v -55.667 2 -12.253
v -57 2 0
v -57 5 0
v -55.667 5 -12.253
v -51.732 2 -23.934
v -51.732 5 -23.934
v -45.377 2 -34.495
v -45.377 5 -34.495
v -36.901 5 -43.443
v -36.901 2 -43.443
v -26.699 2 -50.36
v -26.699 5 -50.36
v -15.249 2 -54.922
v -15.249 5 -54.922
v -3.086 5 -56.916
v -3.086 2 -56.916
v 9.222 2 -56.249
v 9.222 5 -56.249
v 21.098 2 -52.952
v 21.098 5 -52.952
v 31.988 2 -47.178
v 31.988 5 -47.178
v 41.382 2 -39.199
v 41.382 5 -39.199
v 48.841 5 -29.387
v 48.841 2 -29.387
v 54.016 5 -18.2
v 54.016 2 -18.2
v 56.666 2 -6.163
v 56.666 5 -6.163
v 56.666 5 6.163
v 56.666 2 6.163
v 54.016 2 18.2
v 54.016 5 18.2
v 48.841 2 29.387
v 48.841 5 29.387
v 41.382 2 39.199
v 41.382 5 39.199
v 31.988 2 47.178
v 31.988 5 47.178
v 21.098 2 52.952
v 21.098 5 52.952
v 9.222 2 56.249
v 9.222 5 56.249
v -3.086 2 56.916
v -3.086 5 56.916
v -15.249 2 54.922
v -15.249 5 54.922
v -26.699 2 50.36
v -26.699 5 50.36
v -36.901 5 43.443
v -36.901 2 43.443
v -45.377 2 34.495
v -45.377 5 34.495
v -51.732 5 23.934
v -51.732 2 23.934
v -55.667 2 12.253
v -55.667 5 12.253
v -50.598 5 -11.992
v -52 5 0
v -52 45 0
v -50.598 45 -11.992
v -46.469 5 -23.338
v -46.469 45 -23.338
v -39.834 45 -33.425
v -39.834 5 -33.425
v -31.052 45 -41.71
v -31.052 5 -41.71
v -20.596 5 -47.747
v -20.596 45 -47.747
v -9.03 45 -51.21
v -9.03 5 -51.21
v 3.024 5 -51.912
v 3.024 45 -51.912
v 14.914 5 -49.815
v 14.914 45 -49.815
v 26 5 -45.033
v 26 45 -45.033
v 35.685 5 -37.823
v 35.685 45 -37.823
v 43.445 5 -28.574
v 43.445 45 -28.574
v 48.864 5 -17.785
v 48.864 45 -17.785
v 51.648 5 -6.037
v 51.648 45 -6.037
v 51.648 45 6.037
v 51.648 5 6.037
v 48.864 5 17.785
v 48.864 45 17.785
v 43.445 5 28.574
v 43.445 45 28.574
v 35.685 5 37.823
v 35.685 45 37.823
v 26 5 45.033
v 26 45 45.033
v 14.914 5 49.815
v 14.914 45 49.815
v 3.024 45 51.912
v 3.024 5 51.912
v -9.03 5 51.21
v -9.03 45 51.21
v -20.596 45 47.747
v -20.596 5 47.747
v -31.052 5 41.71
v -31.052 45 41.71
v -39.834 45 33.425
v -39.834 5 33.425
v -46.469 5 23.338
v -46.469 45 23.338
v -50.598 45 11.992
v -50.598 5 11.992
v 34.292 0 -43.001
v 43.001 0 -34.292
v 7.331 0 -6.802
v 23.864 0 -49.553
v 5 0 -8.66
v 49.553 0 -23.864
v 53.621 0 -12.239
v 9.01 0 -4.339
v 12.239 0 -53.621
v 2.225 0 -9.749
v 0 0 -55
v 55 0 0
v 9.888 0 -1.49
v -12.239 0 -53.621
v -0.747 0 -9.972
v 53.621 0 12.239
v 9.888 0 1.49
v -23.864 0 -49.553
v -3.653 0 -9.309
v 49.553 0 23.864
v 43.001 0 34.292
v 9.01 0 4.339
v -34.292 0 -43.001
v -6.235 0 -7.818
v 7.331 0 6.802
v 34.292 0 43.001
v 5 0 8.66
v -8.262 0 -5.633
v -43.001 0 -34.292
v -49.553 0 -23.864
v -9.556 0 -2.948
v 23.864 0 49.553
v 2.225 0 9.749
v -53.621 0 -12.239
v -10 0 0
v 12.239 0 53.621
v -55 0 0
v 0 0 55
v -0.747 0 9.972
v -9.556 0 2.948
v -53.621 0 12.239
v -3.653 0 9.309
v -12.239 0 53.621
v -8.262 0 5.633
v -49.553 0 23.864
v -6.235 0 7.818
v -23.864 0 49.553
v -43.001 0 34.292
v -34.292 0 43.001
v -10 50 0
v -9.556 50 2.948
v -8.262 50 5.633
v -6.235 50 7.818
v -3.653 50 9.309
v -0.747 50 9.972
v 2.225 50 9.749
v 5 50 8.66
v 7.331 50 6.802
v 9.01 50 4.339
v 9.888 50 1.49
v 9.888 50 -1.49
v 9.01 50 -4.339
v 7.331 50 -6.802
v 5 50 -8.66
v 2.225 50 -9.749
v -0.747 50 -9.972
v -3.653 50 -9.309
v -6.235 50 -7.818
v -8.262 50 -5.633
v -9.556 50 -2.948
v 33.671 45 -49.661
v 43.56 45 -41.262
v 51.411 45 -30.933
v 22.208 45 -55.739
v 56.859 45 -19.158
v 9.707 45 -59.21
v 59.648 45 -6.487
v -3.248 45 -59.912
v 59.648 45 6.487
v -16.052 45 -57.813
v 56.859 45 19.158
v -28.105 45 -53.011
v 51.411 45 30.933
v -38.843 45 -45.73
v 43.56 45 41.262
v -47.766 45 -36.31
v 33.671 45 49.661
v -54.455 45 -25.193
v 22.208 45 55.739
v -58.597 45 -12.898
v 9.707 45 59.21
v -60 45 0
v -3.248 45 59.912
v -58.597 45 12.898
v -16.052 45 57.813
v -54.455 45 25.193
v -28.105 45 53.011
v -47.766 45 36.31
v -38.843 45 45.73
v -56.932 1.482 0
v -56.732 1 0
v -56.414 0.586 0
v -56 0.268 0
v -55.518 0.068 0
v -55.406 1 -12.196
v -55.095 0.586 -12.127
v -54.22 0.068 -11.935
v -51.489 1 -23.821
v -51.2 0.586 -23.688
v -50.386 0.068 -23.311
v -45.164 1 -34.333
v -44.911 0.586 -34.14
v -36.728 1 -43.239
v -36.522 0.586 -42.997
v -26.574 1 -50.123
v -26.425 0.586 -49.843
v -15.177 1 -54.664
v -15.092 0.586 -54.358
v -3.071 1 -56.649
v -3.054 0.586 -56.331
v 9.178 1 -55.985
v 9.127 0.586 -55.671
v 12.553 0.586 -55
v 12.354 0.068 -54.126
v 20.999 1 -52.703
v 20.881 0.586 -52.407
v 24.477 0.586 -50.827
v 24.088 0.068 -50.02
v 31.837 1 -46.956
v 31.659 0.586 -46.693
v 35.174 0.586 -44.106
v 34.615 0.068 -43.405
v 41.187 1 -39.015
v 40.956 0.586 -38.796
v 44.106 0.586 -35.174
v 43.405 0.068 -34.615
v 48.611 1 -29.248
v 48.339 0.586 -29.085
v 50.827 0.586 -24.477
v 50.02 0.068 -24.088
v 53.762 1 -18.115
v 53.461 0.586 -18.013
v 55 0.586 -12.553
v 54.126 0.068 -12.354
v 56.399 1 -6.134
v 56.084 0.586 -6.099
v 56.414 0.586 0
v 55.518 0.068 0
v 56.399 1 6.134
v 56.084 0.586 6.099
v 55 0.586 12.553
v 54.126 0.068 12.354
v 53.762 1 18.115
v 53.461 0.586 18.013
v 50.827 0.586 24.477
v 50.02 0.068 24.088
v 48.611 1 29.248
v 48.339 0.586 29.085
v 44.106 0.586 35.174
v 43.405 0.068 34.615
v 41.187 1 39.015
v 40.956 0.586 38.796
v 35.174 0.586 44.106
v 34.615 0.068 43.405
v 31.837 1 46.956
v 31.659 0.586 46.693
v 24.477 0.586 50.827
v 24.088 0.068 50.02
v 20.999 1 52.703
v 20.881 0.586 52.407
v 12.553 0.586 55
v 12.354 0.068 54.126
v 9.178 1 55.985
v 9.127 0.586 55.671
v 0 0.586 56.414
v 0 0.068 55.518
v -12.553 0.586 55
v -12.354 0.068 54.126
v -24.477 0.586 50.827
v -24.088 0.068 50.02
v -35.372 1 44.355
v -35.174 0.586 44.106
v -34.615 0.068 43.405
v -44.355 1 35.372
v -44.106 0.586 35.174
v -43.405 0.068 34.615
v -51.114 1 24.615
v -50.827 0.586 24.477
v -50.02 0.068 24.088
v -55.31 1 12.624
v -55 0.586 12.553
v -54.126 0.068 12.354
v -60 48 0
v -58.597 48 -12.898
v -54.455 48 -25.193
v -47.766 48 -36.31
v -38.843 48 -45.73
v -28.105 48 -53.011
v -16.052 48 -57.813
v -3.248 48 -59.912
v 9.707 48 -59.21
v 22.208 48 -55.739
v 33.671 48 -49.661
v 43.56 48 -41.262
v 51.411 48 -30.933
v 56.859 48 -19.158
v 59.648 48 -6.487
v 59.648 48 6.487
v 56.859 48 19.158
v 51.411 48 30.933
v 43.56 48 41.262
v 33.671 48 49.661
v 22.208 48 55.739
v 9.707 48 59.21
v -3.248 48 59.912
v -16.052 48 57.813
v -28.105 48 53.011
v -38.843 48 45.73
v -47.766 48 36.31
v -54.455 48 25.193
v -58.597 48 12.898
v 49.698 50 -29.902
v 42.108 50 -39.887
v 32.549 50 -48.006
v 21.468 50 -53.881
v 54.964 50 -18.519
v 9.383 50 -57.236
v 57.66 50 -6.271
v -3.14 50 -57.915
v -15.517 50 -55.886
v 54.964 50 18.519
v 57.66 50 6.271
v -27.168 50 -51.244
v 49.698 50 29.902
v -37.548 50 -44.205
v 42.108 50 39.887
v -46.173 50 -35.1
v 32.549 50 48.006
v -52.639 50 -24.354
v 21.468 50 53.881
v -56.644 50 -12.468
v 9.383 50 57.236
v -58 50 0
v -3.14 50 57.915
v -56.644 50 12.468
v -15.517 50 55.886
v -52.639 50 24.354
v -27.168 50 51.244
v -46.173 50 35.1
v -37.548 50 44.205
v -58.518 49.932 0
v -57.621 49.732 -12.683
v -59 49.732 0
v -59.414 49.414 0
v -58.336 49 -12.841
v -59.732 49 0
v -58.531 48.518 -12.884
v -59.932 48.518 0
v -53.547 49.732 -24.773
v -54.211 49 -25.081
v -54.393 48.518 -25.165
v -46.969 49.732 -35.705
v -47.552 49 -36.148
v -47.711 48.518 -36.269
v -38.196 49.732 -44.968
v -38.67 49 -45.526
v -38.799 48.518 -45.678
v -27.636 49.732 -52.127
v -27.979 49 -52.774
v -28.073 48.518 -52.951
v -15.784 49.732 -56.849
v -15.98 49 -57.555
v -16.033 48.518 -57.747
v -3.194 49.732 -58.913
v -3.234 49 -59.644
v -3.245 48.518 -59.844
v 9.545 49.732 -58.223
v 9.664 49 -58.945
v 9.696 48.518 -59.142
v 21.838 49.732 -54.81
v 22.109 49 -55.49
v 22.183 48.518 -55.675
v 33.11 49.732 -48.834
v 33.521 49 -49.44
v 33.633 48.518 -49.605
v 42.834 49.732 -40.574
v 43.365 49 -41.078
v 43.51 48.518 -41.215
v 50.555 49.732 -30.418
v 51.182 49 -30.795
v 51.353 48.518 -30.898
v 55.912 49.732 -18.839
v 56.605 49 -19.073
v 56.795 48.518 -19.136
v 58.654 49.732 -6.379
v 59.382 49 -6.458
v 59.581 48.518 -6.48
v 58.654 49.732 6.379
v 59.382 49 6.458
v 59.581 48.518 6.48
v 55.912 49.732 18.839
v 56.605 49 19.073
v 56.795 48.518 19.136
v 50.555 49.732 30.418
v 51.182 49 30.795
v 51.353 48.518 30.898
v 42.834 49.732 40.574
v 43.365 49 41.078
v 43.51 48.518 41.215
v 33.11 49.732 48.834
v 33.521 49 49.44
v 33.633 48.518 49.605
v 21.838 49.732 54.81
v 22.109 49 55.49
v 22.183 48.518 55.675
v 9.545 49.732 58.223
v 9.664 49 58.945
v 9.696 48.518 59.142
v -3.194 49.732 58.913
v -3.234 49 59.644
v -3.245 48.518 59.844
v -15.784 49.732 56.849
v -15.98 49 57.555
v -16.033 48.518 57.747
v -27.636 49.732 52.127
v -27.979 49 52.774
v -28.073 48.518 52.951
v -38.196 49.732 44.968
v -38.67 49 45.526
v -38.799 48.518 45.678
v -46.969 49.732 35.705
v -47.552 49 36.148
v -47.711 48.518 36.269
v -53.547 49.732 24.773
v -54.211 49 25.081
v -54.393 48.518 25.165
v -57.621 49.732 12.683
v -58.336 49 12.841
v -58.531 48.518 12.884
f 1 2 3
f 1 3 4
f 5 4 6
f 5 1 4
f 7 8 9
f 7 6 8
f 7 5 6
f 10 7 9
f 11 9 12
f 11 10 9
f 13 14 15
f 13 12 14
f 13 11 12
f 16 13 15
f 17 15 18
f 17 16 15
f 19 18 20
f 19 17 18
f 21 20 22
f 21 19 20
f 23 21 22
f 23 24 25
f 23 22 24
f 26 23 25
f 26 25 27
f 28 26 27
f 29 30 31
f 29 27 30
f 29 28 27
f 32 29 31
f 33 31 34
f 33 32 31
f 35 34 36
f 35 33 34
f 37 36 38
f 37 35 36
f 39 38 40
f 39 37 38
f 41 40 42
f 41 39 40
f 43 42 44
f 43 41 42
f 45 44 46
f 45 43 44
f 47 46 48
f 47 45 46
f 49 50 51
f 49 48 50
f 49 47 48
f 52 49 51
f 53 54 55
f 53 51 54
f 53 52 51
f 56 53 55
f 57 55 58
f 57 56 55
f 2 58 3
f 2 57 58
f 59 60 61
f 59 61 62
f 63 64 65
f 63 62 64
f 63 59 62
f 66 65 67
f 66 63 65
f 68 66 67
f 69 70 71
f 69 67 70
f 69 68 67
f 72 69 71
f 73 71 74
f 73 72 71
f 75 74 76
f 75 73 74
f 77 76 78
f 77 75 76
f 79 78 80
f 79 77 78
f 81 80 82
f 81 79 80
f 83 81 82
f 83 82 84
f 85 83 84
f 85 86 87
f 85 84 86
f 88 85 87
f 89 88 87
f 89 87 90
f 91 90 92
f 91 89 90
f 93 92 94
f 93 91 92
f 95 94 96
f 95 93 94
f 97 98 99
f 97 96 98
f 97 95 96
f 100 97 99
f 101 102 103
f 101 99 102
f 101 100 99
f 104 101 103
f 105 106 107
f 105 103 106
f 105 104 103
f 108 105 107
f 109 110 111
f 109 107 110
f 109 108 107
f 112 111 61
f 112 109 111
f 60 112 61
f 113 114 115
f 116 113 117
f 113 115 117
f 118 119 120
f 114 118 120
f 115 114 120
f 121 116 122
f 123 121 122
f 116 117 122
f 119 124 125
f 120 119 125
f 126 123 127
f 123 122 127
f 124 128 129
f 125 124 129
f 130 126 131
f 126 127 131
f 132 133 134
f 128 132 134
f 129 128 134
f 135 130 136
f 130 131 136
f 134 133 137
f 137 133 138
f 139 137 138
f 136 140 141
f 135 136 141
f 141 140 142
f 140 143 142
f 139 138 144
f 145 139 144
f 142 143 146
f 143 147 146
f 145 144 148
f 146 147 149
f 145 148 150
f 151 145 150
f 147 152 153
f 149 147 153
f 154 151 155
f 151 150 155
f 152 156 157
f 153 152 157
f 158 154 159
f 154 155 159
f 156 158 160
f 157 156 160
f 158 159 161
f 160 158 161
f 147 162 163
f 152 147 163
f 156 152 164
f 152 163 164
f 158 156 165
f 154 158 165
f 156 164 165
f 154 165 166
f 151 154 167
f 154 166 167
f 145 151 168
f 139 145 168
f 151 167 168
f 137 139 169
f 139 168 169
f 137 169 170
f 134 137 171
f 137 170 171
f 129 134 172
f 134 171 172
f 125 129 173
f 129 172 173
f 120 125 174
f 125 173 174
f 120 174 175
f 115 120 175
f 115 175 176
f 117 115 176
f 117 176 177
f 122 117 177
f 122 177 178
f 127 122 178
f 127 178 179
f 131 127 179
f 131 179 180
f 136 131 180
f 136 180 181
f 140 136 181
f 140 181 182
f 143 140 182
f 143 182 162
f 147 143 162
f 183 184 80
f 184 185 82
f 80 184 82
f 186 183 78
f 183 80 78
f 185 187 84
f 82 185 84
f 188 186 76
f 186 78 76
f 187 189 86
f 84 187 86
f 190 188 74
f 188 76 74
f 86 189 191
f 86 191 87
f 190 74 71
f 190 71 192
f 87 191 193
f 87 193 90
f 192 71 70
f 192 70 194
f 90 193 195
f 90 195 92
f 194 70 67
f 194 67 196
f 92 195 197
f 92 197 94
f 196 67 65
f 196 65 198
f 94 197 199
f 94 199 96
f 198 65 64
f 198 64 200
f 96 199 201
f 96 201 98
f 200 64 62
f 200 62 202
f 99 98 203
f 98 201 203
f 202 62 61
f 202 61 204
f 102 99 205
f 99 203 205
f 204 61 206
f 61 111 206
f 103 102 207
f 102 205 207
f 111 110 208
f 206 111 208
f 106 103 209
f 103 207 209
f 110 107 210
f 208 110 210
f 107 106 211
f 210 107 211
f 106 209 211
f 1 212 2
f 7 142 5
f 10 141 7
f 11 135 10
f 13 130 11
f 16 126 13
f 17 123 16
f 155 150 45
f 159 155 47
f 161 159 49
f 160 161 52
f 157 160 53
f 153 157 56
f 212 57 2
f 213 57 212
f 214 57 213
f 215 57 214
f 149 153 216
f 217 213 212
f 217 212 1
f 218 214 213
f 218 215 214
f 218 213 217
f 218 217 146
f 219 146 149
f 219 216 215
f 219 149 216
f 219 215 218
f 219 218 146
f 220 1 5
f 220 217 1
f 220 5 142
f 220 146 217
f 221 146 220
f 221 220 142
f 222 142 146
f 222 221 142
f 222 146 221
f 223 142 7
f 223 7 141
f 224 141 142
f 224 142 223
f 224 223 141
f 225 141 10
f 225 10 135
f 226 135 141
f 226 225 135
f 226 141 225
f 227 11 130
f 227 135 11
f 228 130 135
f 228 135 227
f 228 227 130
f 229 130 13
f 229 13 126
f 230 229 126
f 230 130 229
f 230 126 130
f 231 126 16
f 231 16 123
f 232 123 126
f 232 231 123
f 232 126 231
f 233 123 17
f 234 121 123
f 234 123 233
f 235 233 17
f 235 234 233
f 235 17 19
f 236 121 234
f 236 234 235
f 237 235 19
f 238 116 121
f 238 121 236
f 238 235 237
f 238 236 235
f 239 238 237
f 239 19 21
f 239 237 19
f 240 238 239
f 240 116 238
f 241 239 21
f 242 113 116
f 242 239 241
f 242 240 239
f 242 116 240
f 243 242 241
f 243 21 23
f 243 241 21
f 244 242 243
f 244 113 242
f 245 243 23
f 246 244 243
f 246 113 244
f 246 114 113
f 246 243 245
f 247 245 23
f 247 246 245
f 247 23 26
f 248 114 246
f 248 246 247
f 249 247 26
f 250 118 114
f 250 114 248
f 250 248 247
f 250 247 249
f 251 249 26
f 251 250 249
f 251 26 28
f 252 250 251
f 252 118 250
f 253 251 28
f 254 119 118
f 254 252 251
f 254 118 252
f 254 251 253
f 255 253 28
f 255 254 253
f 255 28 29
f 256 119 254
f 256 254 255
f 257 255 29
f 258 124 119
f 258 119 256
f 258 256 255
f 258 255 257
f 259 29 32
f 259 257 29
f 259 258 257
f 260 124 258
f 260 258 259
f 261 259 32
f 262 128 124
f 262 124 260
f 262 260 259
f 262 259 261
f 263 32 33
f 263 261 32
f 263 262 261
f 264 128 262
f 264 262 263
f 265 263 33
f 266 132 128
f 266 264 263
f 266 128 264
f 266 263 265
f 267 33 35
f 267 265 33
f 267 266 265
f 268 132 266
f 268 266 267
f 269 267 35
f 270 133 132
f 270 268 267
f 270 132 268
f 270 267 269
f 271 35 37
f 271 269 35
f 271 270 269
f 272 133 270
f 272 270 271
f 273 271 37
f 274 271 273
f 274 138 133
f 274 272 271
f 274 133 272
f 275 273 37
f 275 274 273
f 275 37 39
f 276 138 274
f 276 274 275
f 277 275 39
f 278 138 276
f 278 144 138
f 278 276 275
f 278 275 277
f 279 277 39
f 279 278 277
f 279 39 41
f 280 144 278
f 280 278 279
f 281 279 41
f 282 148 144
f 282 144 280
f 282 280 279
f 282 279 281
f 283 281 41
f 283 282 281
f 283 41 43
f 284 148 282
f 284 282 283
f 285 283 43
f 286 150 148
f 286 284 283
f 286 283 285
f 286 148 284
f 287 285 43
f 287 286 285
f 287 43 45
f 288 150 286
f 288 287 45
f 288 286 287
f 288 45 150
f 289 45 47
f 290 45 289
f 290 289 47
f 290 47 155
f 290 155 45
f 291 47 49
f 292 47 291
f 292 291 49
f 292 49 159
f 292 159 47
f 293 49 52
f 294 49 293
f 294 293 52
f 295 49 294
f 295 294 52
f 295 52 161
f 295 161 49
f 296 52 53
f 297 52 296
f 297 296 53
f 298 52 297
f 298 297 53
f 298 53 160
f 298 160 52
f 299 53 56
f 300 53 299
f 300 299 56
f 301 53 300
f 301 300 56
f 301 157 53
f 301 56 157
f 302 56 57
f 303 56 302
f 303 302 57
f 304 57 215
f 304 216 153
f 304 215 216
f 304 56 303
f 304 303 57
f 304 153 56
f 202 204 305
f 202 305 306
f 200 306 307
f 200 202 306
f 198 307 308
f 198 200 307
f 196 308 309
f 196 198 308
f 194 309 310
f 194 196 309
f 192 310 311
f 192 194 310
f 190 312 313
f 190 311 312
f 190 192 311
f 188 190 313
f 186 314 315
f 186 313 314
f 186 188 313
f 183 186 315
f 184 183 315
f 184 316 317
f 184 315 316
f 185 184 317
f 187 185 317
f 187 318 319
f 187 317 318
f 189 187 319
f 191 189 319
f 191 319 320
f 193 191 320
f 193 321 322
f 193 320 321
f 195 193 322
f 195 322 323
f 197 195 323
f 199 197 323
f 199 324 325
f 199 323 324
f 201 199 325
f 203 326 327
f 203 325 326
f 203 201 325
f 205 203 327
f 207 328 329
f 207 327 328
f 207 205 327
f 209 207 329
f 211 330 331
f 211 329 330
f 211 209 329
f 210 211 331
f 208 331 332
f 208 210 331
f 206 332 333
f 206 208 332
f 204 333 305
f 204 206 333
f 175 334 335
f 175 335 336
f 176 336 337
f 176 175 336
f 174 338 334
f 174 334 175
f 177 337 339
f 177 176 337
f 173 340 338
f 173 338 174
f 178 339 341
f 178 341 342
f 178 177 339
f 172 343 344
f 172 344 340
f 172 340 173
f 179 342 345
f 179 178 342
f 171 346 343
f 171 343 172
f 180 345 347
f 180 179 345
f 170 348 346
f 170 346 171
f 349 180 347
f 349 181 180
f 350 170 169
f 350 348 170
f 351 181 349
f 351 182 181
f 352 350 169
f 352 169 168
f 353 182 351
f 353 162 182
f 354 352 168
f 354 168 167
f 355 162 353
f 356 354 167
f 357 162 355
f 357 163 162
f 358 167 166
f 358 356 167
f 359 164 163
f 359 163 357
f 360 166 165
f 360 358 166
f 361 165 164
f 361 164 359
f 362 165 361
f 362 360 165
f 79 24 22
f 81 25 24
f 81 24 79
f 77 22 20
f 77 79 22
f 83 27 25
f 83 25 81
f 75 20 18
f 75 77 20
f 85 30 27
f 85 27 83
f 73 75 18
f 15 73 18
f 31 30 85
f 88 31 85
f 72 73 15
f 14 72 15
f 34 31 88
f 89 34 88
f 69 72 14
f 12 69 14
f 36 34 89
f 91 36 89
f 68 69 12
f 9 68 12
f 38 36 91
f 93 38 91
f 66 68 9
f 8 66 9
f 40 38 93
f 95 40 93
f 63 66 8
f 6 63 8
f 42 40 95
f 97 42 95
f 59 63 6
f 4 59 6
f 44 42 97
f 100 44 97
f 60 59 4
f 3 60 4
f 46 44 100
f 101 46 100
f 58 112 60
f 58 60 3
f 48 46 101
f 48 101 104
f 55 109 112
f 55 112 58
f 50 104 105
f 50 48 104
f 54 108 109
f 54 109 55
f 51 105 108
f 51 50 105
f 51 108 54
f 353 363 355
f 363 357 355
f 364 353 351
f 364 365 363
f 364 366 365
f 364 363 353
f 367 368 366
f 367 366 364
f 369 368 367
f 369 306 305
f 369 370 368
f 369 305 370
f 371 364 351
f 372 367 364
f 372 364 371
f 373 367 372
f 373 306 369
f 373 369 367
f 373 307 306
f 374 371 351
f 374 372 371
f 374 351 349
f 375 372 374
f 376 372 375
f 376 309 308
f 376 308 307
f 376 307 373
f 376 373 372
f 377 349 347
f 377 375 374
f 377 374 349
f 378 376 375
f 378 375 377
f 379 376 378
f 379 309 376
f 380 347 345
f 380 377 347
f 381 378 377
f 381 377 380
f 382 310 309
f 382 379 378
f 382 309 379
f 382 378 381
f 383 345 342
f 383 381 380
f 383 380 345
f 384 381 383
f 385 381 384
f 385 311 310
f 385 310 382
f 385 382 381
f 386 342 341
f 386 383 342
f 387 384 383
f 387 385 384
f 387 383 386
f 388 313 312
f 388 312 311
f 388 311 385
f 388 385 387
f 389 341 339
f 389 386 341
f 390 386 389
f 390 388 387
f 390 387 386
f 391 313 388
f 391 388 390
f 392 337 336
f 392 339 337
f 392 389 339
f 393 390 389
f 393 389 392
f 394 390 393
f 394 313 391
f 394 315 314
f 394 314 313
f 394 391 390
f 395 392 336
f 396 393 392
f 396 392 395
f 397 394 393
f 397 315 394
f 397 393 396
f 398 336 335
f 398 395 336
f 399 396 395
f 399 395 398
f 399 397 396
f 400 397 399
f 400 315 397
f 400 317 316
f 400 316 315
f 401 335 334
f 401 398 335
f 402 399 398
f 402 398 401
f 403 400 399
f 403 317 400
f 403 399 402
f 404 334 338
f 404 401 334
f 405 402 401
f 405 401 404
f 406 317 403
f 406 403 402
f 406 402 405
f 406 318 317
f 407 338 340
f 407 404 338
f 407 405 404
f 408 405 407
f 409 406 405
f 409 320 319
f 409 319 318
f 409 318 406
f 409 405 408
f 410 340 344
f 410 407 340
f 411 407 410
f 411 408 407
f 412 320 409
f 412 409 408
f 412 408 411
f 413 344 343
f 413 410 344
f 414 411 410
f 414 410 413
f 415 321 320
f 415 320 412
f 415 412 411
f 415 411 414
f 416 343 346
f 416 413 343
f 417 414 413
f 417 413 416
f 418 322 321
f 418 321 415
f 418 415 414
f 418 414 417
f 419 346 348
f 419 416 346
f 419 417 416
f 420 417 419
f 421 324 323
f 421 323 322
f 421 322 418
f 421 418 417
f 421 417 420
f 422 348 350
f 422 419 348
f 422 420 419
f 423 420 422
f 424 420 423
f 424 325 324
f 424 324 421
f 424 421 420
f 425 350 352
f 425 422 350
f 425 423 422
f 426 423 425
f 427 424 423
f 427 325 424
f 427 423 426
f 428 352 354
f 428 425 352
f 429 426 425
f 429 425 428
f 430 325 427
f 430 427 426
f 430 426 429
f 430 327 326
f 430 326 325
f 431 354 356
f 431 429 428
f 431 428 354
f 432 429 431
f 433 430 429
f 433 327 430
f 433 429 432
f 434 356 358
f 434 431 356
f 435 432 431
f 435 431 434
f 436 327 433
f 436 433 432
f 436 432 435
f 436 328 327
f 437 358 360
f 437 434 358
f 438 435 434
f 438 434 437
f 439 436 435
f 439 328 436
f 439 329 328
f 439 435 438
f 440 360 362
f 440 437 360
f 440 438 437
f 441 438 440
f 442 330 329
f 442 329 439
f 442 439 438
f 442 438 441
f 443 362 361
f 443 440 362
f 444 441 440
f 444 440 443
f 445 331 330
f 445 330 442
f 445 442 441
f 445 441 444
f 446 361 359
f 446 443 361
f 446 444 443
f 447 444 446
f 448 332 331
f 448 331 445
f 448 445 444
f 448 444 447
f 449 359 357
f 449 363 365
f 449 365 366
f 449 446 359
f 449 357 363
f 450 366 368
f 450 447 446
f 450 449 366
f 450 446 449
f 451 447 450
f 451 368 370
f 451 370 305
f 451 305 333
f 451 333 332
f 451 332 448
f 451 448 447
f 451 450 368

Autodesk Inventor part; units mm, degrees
ref_plane "YZ Plane" through (0, 0, 0) normal (1, 0, 0) x (0, 1, 0)
ref_plane "XZ Plane" through (0, 0, 0) normal (0, 1, 0) x (-1, 0, 0)
ref_plane "XY Plane" through (0, 0, 0) normal (0, 0, 1) x (1, 0, 0)
sketch "Sketch1" plane through (0, 0, 0) normal (0, 0, 1) x (1, 0, 0)
  line L0 (0, 0) -> (0, 50)
  line L1 (-10, 50) -> (-58, 50)
  line L2 (-60, 48) -> (-60, 45)
  line L3 (-60, 45) -> (-52, 45)
  line L4 (-52, 45) -> (-52, 5)
  line L5 (-52, 5) -> (-57, 5)
  line L6 (-57, 5) -> (-57, 2)
  line L7 (-55, 0) -> (-10, 0)
  line L8 (-10, 0) -> (-10, 50)
  arc A0 (-58, 50) -> (-60, 48) centre (-58, 48) ccw
  arc A1 (-57, 2) -> (-55, 0) centre (-55, 2) ccw
  point P0 (-60, 50)
  point P1 (-57, 0)
  dimension "d0" = 50
  dimension "d1" = 10
  dimension "d2" = 50
  dimension "d3" = 5
  dimension "d4" = 8
  dimension "d5" = 40
  dimension "d6" = 5
  dimension "d7" = 47
  dimension "d8" = 2
revolve "Revolution1" add sketch "Sketch1" angle 360 about axis through (0, 0, 0) along (0, 1, 0)
properties part number "rail wheel" material "Stainless Steel"
